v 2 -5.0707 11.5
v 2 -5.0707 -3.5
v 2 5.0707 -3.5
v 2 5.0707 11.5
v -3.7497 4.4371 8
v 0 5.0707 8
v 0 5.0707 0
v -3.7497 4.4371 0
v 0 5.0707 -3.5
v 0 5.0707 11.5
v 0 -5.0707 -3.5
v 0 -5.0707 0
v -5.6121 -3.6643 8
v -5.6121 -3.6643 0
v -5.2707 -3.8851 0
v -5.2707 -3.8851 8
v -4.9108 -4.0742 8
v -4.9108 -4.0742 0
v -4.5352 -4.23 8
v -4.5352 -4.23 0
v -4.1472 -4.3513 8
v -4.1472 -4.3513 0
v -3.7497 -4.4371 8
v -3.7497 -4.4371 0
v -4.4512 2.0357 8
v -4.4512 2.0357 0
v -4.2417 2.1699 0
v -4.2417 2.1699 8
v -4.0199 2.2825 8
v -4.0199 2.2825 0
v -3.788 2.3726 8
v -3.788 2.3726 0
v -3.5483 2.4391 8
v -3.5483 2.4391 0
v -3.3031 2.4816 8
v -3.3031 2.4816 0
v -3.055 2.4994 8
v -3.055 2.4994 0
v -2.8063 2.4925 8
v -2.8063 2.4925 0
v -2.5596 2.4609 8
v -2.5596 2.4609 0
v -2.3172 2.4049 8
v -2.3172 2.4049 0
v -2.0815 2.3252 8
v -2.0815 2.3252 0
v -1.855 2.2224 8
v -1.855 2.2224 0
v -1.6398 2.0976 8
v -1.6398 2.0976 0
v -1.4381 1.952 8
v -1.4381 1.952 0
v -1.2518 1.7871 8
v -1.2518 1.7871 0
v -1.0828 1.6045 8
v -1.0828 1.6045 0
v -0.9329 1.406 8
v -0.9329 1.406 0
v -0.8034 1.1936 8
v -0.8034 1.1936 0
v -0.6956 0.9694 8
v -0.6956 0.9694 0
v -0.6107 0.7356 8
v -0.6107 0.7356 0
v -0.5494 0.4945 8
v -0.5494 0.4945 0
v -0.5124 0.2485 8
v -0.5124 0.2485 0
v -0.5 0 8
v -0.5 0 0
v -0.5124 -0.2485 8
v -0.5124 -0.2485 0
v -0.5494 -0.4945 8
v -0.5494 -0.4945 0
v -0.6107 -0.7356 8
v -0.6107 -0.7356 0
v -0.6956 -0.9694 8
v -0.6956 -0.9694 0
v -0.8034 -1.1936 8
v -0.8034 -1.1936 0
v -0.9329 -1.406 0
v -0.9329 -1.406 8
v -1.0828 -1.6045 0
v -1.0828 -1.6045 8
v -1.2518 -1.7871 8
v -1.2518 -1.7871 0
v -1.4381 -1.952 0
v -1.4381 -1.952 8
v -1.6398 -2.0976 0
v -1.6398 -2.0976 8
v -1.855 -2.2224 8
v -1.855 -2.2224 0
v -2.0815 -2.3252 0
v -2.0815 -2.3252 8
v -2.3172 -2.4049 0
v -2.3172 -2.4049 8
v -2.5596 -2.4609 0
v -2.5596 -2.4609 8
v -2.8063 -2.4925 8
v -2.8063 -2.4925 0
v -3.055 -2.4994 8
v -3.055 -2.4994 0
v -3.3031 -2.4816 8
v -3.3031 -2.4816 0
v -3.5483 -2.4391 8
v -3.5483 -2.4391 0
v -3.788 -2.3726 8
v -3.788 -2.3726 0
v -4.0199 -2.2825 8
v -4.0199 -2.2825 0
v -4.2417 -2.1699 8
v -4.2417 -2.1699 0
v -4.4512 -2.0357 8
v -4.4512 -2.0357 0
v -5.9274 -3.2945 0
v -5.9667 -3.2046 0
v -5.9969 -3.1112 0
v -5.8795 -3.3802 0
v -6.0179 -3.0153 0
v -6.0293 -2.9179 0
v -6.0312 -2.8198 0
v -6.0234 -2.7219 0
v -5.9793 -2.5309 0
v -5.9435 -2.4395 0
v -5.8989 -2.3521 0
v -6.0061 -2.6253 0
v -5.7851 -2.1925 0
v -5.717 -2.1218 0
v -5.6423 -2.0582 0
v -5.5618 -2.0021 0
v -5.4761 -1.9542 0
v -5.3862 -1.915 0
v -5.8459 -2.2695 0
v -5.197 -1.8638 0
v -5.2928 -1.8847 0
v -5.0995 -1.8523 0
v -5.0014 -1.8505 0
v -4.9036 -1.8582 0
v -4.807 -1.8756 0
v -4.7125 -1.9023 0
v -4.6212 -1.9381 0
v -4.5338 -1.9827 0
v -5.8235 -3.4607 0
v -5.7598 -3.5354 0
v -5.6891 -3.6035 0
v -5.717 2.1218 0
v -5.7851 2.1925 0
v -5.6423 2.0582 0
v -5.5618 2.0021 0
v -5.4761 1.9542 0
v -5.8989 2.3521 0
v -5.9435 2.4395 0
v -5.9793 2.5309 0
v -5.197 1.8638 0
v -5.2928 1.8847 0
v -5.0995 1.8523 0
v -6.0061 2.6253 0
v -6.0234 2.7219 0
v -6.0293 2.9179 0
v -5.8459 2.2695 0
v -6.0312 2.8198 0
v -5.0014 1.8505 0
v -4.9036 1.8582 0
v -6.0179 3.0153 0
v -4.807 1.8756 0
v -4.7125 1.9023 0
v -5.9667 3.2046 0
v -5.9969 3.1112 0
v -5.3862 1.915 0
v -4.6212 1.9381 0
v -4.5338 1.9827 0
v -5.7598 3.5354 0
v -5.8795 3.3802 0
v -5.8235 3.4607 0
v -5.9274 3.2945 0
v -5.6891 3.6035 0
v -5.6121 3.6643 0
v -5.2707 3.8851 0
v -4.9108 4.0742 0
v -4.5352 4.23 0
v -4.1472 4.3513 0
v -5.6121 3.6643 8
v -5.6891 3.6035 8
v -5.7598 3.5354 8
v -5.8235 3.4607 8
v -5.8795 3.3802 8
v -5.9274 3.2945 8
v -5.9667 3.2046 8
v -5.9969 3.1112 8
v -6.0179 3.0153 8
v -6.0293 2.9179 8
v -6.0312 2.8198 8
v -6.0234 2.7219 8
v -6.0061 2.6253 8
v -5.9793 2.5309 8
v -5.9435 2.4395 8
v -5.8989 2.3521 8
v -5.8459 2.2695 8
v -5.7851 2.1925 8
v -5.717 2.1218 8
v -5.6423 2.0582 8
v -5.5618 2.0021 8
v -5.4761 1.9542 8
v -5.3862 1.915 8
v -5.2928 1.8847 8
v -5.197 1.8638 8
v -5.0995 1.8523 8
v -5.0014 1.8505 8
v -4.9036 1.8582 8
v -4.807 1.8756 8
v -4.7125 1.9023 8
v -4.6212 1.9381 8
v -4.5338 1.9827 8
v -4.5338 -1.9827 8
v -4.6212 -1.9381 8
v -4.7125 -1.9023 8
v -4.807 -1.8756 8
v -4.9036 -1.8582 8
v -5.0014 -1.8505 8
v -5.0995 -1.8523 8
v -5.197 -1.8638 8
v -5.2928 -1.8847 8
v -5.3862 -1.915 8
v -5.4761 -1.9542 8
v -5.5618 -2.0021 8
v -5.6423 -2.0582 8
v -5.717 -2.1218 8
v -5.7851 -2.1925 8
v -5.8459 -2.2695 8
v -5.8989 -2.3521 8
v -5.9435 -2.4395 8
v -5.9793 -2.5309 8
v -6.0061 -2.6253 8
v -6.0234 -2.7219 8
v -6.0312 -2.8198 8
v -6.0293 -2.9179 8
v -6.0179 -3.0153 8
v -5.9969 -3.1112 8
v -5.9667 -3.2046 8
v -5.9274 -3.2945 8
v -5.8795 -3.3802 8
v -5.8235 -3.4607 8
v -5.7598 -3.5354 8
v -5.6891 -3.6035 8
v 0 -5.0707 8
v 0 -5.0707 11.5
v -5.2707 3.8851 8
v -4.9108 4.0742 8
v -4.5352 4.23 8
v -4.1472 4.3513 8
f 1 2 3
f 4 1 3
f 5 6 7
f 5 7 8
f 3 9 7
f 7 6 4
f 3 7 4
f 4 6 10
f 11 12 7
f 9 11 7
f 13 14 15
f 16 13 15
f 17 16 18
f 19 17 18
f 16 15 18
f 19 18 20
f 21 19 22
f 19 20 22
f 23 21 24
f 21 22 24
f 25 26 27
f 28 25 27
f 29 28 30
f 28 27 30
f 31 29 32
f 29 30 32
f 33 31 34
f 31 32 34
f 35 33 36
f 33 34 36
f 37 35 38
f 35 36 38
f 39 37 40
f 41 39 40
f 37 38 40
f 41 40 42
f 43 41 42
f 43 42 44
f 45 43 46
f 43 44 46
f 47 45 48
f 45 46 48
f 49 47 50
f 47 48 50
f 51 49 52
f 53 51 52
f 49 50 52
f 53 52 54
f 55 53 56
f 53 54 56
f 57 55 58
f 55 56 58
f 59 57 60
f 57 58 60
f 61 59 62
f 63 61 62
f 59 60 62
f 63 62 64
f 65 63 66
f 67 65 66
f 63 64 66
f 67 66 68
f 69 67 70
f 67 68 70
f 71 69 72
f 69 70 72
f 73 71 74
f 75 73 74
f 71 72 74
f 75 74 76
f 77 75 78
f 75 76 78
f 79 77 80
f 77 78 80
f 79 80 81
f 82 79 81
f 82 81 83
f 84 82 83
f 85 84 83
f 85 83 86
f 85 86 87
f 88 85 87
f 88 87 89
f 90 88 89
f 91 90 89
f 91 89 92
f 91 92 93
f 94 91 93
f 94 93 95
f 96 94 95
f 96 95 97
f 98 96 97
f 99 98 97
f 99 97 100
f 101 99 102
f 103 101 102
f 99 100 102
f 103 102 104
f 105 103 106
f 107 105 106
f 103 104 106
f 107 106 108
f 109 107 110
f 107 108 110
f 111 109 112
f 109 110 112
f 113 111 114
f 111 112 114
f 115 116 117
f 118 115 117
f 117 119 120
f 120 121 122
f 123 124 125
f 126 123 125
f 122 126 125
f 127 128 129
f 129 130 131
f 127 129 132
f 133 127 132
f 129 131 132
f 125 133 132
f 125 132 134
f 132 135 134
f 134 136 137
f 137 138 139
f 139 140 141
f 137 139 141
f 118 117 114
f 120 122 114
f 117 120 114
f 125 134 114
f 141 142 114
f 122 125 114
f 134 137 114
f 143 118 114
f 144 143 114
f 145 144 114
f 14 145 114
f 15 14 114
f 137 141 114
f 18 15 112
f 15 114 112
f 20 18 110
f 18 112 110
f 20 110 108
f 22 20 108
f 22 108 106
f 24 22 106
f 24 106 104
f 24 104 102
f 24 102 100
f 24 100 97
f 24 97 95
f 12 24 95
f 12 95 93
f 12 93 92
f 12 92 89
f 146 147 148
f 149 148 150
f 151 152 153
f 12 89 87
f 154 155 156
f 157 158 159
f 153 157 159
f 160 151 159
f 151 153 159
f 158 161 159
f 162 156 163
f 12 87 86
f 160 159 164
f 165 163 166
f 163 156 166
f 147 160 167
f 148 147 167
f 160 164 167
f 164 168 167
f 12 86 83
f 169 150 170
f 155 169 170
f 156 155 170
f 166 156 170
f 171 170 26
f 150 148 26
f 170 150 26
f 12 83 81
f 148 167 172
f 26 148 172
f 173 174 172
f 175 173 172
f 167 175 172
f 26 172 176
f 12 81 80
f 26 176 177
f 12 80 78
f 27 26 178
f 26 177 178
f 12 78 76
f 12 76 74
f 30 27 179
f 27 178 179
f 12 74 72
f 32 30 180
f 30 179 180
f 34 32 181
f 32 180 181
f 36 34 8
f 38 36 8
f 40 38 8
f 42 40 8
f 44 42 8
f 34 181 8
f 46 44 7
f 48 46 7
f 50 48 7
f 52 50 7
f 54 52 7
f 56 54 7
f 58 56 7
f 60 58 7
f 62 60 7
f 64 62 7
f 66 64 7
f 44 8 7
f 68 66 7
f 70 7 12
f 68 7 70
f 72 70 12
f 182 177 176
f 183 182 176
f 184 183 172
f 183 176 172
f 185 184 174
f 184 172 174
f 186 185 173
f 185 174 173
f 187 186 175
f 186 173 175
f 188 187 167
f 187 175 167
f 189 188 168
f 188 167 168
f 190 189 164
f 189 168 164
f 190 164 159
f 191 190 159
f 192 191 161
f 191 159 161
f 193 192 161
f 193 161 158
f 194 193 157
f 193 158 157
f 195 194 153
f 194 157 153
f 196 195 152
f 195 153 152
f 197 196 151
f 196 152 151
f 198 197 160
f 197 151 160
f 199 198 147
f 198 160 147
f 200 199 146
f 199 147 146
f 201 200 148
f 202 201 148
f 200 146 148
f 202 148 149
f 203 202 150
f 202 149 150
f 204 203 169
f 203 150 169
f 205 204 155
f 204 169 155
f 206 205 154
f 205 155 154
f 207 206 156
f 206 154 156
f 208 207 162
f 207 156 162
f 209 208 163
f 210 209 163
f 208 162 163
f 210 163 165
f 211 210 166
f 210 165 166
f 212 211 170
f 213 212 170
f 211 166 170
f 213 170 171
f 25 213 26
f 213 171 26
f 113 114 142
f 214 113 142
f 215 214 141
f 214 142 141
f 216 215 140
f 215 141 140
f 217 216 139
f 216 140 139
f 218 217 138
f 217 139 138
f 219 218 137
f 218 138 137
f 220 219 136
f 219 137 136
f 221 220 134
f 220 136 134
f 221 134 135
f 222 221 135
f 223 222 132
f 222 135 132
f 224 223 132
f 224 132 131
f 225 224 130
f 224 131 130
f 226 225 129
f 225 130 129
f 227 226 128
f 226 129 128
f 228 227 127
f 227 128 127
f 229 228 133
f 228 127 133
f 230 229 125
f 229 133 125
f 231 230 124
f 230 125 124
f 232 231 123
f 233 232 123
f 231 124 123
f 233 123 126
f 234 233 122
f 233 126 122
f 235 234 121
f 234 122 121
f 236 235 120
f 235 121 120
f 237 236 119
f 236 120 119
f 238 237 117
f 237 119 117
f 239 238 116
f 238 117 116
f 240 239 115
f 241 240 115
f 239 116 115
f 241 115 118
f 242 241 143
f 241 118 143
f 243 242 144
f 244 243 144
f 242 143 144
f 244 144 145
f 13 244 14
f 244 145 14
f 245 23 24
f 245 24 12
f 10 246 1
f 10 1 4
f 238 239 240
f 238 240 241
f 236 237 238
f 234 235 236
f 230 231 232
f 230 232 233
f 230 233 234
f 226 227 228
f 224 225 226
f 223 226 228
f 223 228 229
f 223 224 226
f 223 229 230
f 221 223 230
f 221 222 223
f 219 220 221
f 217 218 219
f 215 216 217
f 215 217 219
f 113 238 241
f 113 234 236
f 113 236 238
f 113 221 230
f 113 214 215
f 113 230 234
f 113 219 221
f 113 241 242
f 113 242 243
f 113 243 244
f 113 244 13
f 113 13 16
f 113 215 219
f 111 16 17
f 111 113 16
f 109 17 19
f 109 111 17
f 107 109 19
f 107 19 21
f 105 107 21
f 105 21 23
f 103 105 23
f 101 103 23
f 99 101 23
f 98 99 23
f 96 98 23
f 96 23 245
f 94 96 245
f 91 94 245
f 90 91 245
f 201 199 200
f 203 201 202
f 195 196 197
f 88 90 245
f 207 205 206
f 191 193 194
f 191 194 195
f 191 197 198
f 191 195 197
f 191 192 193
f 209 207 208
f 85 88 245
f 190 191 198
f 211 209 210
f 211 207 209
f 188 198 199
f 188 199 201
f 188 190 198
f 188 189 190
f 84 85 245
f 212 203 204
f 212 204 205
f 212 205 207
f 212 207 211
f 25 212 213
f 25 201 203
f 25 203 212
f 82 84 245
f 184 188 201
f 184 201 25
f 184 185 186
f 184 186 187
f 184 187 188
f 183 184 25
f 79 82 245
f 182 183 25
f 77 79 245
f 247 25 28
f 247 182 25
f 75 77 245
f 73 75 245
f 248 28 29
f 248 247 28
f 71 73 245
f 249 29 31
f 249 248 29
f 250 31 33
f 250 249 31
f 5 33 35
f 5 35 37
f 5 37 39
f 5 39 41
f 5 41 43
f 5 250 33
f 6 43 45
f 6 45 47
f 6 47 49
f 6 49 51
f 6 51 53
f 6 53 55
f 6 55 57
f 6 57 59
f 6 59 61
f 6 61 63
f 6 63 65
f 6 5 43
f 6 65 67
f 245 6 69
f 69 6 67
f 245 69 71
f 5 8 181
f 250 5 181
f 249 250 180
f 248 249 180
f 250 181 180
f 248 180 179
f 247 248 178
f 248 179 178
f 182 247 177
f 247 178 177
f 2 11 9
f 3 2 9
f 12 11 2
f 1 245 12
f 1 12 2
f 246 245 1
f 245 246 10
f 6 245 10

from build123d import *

# Parameters (mm, degrees)
F1_DEPTH = 8
F2_W     = 10.141368
F2_H     = 15
F3_DEPTH = 2


with BuildPart() as f1:
    # F0 (on Top) → F1 (new body)
    with BuildSketch(Plane.XY):
        with BuildLine():
            ThreePointArc((-4.451161, 2.035714), (-0.5, 0), (-4.451161, -2.035714))
            ThreePointArc((-4.451161, -2.035714), (-5.845911, -2.269536), (-5.612089, -3.664286))
            ThreePointArc((-5.612089, -3.664286), (-4.724749, -4.15635), (-3.749722, -4.437107))
            Line((-3.749722, -4.437107), (0, -5.070684))
            Line((0, -5.070684), (0, 5.070684))
            Line((0, 5.070684), (-3.749722, 4.437107))
            ThreePointArc((-3.749722, 4.437107), (-4.724749, 4.15635), (-5.612089, 3.664286))
            ThreePointArc((-5.612089, 3.664286), (-5.845911, 2.269536), (-4.451161, 2.035714))
        make_face()
    extrude(amount=F1_DEPTH)

    # F2 (on face) → F3 (join)
    with BuildSketch(Plane.YZ):
        with Locations((0, 4)):
            Rectangle(F2_W, F2_H)
    extrude(amount=F3_DEPTH)


solid = f1.part
